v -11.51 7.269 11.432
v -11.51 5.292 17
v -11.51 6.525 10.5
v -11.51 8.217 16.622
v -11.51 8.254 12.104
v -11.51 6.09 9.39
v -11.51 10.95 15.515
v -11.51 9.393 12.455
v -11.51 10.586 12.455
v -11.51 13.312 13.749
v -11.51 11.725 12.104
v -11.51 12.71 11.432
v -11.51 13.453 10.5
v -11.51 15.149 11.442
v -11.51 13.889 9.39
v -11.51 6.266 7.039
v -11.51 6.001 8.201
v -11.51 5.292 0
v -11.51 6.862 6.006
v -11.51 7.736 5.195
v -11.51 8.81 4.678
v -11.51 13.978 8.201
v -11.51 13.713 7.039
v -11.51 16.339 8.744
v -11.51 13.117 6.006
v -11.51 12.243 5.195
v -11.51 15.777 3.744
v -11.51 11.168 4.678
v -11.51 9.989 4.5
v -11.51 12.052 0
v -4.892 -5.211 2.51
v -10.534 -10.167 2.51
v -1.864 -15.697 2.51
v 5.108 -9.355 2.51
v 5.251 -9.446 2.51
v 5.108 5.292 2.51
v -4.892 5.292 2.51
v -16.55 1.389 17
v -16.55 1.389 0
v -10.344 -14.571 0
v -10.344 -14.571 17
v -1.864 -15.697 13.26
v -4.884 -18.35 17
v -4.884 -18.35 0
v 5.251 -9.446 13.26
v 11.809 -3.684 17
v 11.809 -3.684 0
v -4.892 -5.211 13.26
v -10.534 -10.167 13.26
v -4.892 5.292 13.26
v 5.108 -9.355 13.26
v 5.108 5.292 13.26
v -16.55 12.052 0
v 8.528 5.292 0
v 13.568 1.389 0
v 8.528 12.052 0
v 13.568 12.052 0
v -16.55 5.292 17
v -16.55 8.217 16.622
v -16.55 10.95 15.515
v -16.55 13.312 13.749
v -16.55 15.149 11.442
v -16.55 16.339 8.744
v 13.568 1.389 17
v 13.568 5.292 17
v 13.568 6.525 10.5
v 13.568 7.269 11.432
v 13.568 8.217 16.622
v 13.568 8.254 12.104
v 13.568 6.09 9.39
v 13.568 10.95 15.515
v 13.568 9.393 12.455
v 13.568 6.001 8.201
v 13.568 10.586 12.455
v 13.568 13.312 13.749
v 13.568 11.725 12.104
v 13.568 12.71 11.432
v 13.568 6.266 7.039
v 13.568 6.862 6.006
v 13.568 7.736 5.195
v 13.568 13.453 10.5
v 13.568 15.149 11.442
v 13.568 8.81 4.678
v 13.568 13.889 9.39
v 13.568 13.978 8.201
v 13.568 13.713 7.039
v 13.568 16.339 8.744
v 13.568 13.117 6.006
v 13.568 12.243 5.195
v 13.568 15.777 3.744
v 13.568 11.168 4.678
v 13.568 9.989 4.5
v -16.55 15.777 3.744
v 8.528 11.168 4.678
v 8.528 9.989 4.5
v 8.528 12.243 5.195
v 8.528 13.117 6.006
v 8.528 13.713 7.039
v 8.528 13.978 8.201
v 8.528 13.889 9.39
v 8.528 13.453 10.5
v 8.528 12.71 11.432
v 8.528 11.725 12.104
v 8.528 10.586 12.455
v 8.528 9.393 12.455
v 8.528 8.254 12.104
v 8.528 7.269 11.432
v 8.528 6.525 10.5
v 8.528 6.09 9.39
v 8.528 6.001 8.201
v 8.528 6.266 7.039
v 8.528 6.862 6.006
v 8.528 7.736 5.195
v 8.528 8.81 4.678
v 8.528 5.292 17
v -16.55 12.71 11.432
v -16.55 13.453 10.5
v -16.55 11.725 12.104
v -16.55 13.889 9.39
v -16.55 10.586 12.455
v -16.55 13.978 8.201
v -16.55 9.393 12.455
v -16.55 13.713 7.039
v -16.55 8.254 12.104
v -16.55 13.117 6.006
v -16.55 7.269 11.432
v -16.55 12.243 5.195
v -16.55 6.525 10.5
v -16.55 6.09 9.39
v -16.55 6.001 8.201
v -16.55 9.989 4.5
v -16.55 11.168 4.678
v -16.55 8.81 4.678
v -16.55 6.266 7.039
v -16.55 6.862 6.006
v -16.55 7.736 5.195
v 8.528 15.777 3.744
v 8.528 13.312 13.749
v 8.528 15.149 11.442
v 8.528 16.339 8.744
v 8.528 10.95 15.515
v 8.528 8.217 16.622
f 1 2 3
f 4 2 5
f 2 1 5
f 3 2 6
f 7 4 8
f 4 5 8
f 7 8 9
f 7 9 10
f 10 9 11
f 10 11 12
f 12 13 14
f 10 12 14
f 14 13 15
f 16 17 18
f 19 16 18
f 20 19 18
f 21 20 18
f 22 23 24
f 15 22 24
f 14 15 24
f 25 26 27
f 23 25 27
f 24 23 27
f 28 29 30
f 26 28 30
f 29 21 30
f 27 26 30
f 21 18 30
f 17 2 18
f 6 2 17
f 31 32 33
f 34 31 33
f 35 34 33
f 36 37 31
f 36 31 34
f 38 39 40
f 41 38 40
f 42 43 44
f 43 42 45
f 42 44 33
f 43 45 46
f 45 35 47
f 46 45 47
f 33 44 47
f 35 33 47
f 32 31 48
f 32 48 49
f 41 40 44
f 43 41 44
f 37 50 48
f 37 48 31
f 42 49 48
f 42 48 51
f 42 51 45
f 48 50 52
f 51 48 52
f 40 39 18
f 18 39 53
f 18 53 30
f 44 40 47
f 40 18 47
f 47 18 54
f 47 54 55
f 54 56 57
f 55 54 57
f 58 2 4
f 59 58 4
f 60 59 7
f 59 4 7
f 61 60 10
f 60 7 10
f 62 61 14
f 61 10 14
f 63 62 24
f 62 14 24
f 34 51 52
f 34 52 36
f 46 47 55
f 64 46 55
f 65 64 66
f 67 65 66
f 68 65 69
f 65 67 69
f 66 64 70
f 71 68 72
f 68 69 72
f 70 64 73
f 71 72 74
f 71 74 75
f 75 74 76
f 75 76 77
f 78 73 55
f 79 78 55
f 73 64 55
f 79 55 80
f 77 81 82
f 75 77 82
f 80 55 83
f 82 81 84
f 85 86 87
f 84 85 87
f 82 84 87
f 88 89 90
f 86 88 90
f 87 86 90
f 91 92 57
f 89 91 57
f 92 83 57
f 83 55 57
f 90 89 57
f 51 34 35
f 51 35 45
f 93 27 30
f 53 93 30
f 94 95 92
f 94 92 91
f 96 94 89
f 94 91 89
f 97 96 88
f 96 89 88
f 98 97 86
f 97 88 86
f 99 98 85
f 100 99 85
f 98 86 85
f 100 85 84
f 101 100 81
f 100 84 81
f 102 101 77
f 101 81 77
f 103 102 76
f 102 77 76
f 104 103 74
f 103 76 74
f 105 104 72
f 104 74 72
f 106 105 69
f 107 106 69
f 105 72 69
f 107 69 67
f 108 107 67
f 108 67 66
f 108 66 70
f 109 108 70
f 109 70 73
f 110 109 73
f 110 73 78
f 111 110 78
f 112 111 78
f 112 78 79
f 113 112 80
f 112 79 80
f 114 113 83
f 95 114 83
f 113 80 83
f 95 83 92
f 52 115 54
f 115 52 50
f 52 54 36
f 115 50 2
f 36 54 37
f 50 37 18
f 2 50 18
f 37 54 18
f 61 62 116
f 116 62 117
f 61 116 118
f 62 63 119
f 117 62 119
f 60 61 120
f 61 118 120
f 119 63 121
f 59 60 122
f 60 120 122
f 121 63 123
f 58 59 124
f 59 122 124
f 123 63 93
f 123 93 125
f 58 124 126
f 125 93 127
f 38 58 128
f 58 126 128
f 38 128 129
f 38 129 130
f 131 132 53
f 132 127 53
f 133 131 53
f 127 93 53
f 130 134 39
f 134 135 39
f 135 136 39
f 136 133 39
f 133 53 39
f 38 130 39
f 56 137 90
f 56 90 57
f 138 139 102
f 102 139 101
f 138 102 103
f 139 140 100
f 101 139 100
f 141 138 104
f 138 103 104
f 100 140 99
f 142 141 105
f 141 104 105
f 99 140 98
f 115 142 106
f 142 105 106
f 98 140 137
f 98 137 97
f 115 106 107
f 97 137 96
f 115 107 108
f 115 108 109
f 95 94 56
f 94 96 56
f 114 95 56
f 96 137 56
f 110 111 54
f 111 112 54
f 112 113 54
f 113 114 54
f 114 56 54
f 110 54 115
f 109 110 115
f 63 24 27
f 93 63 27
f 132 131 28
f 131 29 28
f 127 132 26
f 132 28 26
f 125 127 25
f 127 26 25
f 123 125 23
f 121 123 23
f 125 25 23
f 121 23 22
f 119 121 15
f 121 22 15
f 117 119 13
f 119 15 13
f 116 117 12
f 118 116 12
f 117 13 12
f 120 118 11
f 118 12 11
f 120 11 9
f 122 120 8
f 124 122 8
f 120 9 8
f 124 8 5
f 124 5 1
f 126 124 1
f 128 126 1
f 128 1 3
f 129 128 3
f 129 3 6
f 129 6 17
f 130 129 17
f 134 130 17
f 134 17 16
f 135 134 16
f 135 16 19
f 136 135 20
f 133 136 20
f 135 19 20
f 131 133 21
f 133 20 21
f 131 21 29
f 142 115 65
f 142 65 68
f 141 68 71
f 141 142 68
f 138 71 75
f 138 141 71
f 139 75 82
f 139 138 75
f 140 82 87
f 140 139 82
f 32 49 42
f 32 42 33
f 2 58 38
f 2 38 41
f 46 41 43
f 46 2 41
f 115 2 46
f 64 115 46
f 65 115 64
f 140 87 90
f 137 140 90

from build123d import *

# Parameters (mm, degrees)
BOSS_EXTRUDE1_DEPTH     = 17
CUT_EXTRUDE1_DEPTH      = 44
CUT_EXTRUDE1_DEPTH_BACK = 15
SKETCH3_W               = 9.47
SKETCH3_H               = 10.75
CUT_EXTRUDE2_REACH      = 25.642
SKETCH5_W               = 10
SKETCH5_H               = 10.75
SKETCH6_R               = 4
CUT_EXTRUDE3_DEPTH      = 20


with BuildPart() as part:
    # Sketch1 → Boss-Extrude1 (new body)
    with BuildSketch(Plane.XY):
        Polygon((-16.550185094, 16.389351475), (-16.550185094, 1.389351475), (-10.343680533, -14.570648525), (-4.883984447, -18.349711721), (11.8091046, -3.684474659), (13.567850846, 1.389351475), (13.567850846, 16.389351475), (8.527850846, 16.389351475), (8.527850846, 5.292351475), (-11.510185094, 5.292351475), (-11.510185094, 16.389351475), align=None)
    extrude(amount=BOSS_EXTRUDE1_DEPTH)

    # Sketch2 → Cut-Extrude1 (cut, two sides)
    with BuildSketch(Plane(origin=(-11.510185094, 0, 0), x_dir=(0, 0, -1), z_dir=(1, 0, 0))) as cut_extrude1_sk:
        with BuildLine():
            Line((-17, 16.389351475), (-17, 5.292351475))
            ThreePointArc((-17, 5.292351475), (-14.707938783, 12.187976499), (-8.743930787, 16.339337446))
            Line((-8.743930787, 16.339337446), (-3.743930787, 15.776730228))
            Line((-3.743930787, 15.776730228), (0, 12.052351475))
            Line((0, 12.052351475), (0, 16.389351475))
            Line((0, 16.389351475), (-17, 16.389351475))
        make_face()
    extrude(amount=CUT_EXTRUDE1_DEPTH, mode=Mode.SUBTRACT)
    extrude(cut_extrude1_sk.sketch, amount=-CUT_EXTRUDE1_DEPTH_BACK, mode=Mode.SUBTRACT)

    # Cut-Sweep1: sweep along a path in Sketch4
    with BuildLine(Plane(origin=(0, 0, 10), x_dir=(-1, 0, 0), z_dir=(0, 0, -1))) as cut_sweep1_path:
        Line((0.820338721, -14.779711721), (9.490783662, -9.250648525))
    # Sketch3 → Cut-Sweep1 (sweep, cut)
    with BuildSketch(Plane(origin=(6.970965598, -7.934883628, 0), x_dir=(0.751264134, 0.660001668, 0), z_dir=(0.660001668, -0.751264134, 0))):
        with Locations((-7.025002686, 7.885)):
            Rectangle(SKETCH3_W, SKETCH3_H)
    sweep(path=cut_sweep1_path.line, mode=Mode.SUBTRACT)

    # Cut-Extrude2: up to this face of the body (flat: up to its plane)
    cut_extrude2_end = Plane(part.part.faces().sort_by_distance((-6.1991251, -12.931973418, 7.885))[0])
    # Sketch5 → Cut-Extrude2 (cut, up to the picked face)
    with BuildSketch(Plane(origin=(0, 5.292351475, 0), x_dir=(1, 0, 0), z_dir=(0, 1, 0)), mode=Mode.PRIVATE) as cut_extrude2_sk1:
        with Locations((0.107850846, -7.885)):
            Rectangle(SKETCH5_W, SKETCH5_H)
    cut_extrude2_tool1 = split(extrude(cut_extrude2_sk1.sketch, amount=-CUT_EXTRUDE2_REACH, mode=Mode.PRIVATE), bisect_by=cut_extrude2_end, keep=Keep.BOTH, mode=Mode.PRIVATE)
    add(cut_extrude2_tool1.solids().sort_by_distance((0.107851, 5.292351, 7.885))[0], mode=Mode.SUBTRACT)

    # Sketch6 → Cut-Extrude3 (cut, symmetric)
    with BuildSketch(Plane(origin=(-1.491167124, 0, 0), x_dir=(0, 0, -1), z_dir=(1, 0, 0))):
        with Locations((-8.5, 9.989351475)):
            Circle(SKETCH6_R)
    extrude(amount=CUT_EXTRUDE3_DEPTH, both=True, mode=Mode.SUBTRACT)


solid = part.part
